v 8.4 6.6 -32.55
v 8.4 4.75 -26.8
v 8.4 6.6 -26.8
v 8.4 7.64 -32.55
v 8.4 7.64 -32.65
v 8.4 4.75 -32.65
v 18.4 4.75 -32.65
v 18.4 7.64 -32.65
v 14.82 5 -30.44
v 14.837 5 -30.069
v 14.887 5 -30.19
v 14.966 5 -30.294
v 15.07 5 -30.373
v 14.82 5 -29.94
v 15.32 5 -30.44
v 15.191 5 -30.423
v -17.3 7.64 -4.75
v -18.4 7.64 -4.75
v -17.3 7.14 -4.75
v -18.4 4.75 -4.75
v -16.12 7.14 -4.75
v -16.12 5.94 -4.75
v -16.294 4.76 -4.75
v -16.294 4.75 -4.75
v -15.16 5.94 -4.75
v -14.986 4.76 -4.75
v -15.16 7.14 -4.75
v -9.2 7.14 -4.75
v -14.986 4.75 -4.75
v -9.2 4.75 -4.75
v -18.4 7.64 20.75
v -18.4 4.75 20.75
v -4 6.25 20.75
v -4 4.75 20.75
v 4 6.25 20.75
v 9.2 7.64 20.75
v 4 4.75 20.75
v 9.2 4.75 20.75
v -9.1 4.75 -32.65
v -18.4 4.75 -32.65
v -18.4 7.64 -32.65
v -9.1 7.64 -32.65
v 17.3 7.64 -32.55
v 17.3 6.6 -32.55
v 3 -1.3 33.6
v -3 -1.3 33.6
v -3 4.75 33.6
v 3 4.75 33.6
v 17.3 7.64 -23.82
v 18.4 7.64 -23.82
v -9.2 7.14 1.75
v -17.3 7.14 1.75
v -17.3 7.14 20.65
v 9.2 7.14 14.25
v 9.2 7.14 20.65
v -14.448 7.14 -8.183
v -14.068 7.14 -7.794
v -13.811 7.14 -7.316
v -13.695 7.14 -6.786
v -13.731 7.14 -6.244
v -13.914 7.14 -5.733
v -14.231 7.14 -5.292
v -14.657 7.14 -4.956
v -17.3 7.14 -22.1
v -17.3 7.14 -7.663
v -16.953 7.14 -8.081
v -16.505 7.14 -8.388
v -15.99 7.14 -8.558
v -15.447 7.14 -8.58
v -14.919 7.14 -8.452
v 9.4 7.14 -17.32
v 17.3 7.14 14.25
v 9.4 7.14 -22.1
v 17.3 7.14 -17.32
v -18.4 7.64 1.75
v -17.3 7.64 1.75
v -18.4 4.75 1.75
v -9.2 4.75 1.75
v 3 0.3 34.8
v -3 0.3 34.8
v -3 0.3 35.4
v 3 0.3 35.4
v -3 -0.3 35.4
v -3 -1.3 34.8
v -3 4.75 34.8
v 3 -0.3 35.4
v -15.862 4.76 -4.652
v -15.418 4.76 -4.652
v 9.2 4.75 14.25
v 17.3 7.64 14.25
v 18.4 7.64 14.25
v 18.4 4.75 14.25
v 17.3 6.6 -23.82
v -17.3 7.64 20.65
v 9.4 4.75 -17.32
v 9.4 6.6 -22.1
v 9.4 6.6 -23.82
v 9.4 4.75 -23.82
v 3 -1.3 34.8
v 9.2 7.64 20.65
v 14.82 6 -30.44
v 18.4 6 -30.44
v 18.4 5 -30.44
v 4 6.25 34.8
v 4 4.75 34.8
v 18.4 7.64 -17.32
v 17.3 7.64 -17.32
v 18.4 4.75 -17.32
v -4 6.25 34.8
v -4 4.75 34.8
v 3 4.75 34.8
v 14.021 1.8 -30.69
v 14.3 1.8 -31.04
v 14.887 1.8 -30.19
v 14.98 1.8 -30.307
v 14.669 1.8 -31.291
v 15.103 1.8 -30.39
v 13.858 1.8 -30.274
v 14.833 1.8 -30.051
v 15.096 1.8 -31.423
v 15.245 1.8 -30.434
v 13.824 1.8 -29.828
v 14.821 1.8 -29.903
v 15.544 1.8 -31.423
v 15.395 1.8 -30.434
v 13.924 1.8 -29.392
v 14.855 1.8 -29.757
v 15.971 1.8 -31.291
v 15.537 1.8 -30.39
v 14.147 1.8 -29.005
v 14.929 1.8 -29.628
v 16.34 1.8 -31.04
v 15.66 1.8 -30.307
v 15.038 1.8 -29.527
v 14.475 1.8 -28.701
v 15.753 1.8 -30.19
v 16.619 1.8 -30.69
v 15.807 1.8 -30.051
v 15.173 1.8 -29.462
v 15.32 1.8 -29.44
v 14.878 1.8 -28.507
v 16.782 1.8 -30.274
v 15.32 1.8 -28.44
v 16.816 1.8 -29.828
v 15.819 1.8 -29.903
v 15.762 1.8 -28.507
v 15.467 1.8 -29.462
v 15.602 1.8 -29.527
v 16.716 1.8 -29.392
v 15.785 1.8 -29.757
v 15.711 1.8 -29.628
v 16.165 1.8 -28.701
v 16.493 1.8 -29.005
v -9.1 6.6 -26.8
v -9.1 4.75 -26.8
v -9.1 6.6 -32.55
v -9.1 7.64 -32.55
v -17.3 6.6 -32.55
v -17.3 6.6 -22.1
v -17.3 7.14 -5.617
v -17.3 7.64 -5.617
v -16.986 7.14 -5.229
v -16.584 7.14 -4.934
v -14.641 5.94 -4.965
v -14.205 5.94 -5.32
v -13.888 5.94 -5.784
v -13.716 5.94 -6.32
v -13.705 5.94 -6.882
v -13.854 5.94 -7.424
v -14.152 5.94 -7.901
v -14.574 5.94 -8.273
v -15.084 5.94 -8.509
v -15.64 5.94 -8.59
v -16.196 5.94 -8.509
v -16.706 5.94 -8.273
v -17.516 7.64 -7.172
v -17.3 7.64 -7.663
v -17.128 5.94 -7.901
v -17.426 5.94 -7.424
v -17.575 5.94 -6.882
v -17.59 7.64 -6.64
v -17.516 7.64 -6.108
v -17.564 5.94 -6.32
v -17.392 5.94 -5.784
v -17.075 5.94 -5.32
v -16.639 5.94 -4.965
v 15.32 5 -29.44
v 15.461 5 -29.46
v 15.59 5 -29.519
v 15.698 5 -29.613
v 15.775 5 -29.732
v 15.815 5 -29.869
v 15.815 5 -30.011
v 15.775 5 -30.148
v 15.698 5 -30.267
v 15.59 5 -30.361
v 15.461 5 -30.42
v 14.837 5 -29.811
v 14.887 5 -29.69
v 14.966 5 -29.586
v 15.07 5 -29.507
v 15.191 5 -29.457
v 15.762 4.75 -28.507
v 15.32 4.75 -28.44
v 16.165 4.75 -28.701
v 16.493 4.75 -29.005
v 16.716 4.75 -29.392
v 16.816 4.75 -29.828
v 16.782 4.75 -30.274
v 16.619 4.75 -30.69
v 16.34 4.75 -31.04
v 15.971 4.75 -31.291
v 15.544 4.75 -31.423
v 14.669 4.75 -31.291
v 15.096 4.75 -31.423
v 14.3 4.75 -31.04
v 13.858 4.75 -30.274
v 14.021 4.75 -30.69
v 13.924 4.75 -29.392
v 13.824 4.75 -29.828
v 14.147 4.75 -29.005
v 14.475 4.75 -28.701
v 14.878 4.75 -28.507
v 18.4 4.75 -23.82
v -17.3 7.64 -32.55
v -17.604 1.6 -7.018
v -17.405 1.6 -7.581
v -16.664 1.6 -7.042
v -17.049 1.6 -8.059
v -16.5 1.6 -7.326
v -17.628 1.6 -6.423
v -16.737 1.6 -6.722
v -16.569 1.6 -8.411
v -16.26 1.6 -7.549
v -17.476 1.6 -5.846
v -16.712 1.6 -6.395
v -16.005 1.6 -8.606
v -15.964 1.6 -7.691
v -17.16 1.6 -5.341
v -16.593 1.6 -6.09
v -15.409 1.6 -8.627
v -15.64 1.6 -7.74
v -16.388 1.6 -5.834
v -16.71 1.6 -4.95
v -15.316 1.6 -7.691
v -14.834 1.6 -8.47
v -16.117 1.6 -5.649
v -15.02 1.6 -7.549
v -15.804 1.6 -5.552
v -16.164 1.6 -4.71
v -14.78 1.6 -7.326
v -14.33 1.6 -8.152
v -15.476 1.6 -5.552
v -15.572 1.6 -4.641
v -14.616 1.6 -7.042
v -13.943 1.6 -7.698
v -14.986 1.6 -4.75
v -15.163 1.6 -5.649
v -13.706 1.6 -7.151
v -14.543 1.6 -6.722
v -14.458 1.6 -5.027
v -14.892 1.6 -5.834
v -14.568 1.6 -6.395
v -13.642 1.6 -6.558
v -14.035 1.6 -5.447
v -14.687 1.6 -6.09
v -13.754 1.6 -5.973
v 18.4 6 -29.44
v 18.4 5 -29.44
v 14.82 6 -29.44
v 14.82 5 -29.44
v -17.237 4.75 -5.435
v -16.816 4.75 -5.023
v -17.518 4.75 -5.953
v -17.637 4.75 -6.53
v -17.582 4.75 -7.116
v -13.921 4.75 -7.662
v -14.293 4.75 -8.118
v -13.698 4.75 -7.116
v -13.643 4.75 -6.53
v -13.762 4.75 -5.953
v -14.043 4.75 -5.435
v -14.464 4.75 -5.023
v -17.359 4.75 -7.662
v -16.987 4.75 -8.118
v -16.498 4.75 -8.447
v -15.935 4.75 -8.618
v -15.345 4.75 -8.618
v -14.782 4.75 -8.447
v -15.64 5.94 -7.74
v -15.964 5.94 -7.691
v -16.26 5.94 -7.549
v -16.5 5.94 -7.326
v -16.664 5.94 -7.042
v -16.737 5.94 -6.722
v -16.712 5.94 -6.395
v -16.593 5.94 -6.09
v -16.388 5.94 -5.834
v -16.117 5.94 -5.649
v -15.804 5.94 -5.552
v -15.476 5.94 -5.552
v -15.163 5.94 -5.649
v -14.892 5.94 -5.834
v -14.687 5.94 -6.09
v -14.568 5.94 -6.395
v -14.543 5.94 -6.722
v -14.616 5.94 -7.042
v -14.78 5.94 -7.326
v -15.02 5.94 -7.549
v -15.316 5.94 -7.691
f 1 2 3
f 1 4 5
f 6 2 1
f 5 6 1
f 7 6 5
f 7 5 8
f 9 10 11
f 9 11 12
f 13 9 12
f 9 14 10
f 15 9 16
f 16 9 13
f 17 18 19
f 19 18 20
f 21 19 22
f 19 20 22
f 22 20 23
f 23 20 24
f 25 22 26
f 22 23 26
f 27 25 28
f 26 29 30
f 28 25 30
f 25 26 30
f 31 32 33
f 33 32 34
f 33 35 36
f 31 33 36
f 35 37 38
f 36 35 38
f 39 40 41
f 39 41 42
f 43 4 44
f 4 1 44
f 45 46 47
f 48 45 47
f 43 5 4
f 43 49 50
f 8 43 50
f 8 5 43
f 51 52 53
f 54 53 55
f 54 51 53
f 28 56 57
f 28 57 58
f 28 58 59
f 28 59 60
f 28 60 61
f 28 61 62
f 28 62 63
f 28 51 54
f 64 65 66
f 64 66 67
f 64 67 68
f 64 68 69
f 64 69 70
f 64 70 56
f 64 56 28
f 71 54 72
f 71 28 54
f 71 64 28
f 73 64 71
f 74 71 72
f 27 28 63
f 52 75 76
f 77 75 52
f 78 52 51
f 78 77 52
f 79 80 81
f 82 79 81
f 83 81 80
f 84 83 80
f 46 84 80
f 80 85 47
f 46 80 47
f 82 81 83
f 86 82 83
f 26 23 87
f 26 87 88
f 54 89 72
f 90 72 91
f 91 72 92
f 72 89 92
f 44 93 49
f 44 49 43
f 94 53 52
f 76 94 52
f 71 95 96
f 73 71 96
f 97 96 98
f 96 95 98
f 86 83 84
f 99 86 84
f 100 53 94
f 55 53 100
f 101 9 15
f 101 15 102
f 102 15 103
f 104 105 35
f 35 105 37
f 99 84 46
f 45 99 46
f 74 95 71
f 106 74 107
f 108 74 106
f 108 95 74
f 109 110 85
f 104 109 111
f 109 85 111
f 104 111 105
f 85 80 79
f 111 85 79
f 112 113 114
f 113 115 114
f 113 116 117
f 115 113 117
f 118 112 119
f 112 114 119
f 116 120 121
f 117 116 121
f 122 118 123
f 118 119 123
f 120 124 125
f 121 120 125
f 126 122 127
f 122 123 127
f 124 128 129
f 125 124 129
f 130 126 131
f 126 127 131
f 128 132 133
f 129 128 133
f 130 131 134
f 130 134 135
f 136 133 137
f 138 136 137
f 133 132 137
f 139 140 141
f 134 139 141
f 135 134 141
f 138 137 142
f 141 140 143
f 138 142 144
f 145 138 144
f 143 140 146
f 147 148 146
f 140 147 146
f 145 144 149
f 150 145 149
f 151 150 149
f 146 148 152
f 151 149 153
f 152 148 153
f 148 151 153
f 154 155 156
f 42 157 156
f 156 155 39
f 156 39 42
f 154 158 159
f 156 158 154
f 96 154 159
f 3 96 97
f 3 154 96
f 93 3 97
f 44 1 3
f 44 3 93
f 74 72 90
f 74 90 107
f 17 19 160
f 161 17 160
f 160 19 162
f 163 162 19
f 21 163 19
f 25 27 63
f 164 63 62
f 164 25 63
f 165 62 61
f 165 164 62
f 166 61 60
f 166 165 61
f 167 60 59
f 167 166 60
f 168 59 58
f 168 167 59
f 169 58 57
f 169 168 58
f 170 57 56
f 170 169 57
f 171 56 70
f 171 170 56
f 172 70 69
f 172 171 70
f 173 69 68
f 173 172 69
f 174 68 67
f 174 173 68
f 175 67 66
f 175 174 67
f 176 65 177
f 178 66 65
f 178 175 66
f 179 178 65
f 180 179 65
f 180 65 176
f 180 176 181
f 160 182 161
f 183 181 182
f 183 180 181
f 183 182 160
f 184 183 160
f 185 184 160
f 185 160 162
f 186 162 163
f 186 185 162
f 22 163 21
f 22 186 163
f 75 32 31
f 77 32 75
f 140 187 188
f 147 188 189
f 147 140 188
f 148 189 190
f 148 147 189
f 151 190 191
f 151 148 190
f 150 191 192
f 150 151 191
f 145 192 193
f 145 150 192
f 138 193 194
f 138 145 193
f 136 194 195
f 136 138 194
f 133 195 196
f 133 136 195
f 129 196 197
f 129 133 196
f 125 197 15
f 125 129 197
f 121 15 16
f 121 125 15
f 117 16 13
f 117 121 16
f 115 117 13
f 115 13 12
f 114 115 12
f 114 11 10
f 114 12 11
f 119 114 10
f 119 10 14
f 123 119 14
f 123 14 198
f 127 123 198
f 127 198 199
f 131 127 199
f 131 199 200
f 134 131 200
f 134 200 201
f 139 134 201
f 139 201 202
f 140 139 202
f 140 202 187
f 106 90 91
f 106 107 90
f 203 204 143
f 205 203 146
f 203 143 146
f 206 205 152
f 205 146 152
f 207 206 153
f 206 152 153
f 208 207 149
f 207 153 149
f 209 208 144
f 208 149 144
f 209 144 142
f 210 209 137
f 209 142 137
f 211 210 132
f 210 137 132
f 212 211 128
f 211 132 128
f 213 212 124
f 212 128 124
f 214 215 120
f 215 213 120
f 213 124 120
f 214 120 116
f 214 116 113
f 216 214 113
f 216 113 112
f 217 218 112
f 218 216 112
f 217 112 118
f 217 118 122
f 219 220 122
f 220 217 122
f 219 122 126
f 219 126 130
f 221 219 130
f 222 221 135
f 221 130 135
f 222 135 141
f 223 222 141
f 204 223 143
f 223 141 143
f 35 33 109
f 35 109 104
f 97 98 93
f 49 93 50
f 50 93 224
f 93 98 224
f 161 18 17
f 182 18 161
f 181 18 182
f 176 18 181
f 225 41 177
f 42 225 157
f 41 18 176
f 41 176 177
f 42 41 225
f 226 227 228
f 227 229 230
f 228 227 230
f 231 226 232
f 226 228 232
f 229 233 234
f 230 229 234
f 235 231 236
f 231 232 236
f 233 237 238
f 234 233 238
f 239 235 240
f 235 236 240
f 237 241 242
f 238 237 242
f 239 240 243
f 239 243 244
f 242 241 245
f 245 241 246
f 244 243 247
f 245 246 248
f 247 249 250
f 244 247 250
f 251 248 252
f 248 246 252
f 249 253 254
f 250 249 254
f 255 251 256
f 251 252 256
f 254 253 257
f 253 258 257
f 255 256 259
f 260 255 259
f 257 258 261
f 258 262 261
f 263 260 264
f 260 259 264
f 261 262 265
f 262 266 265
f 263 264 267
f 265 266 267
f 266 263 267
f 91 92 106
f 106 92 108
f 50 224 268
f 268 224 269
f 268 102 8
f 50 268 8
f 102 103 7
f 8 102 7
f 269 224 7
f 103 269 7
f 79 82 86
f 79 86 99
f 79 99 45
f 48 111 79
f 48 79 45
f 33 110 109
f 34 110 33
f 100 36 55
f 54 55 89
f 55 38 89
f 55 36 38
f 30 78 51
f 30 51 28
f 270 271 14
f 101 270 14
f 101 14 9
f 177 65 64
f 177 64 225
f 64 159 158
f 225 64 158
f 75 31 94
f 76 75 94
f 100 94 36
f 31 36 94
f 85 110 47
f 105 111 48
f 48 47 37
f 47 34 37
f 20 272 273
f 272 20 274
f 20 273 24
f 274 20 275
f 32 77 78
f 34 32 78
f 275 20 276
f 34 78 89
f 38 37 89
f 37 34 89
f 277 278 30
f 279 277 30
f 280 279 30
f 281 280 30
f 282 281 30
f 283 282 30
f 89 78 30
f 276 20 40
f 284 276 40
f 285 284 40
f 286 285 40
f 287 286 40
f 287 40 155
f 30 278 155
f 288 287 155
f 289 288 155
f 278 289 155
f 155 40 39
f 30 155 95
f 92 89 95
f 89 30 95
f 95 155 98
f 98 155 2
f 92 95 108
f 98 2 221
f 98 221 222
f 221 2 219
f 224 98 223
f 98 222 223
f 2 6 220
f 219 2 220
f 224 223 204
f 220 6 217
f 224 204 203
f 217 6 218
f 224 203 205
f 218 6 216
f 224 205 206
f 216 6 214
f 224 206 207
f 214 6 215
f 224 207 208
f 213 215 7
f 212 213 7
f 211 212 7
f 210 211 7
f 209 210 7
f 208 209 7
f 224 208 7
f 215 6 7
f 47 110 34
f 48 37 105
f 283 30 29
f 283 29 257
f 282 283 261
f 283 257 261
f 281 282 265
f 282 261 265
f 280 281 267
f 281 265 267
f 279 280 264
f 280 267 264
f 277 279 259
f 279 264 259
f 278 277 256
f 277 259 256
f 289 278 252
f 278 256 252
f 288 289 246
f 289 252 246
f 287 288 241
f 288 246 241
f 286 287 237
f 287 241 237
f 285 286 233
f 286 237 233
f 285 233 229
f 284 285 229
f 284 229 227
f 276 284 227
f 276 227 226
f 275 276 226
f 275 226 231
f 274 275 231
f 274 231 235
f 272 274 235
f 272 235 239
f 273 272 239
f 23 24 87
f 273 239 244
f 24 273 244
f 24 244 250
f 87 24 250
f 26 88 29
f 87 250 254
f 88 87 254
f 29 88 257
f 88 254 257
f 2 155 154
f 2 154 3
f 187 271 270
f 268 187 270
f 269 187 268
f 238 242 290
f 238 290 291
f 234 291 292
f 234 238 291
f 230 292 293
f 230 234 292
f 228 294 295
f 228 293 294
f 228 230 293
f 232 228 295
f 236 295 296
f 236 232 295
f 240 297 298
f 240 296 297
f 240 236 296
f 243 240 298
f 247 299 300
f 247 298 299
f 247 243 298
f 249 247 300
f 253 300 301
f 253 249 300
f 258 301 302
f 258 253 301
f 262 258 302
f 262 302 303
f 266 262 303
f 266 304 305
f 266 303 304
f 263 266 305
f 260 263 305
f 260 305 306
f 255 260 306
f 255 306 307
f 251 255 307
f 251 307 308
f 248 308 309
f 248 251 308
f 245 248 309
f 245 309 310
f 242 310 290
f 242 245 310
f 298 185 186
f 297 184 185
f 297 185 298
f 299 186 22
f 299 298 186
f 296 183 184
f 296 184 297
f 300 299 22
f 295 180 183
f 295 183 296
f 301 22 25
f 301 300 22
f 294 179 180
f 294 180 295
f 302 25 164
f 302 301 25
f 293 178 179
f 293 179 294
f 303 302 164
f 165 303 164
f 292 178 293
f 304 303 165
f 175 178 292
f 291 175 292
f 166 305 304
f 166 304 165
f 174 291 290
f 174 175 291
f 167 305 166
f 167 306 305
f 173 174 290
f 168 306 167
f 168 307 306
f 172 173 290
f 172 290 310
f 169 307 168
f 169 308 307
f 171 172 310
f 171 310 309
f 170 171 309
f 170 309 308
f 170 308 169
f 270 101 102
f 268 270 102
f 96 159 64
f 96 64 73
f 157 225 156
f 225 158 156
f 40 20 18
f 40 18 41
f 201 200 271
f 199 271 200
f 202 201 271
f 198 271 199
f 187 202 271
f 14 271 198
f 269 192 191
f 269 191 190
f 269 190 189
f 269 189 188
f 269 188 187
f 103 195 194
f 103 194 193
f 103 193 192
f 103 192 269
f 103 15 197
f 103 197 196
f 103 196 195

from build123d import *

# Parameters (mm, degrees)
TRAY_START                        = 4.75
SKETCH1_W                         = 36.8
SKETCH1_H                         = 53.4
TRAY_DEPTH                        = 2.89
GROOVE_START                      = 7.14
SKETCH2_W                         = 34.6
SKETCH2_H                         = 53.2
GROOVE_DEPTH                      = 0.6
GROOVE_START_2                    = 6.6
SKETCH3_W                         = 34.6
SKETCH3_H                         = 10.45
GROOVE_PROTECTION_BOARD_END_DEPTH = 0.55
S1_S3_START                       = 4.65
SKETCH4_W                         = 9.25
SKETCH4_H                         = 6.5
SKETCH4_W_2                       = 9.05
S1_S3_AND_PLUGS_DEPTH             = 3.09
J4_START                          = 4.65
SKETCH5_W                         = 17.5
SKETCH5_H                         = 6
J4_AND_ITS_FLEX_DEPTH             = 3.09
ARM_START                         = 4.75
SKETCH6_W                         = 8
SKETCH6_H                         = 14.2
ARM_DEPTH                         = 1.5
BOARD_START                       = 1.6
SKETCH7_R                         = 2
BOARD_SCREW_FOOT_DEPTH            = 3.16
BOARD_START_2                     = 1.5
SKETCH8_R                         = 1.1
BOARD_SCREW_HOLE_DEPTH            = 6.24
BOARD_START_3                     = 5.94
SKETCH9_R                         = 1.95
BOARD_SCREW_COUNTERBORE_DEPTH     = 1.8
MIC_START                         = 1.8
SKETCH10_R                        = 1.5
MIC_TUBE_DEPTH                    = 2.96
MIC_START_2                       = 1.7
SKETCH11_R                        = 0.5
MIC_BORE_DEPTH                    = 4.3
MIC_START_3                       = 5
SKETCH12_W                        = 3.68
SKETCH12_H                        = 1
MIC_DUCT_DEPTH                    = 1
SNAP_START                        = -3
SNAP_DEPTH                        = 6


with BuildPart() as part:
    # Sketch1 → Tray (new body)
    with BuildSketch(Plane(origin=(0, 0, 0), x_dir=(1, 0, 0), z_dir=(0, 1, 0)).offset(TRAY_START)):
        with Locations((0, 5.95)):
            Rectangle(SKETCH1_W, SKETCH1_H)
    extrude(amount=TRAY_DEPTH)

    # Sketch2 → Groove (cut)
    with BuildSketch(Plane(origin=(0, 0, 0), x_dir=(1, 0, 0), z_dir=(0, 1, 0)).offset(GROOVE_START)):
        with Locations((0, 5.95)):
            Rectangle(SKETCH2_W, SKETCH2_H)
    extrude(amount=GROOVE_DEPTH, mode=Mode.SUBTRACT)

    # Sketch3 → Groove, protection-board end (cut)
    with BuildSketch(Plane(origin=(0, 0, 0), x_dir=(1, 0, 0), z_dir=(0, 1, 0)).offset(GROOVE_START_2)):
        with Locations((0, 27.325)):
            Rectangle(SKETCH3_W, SKETCH3_H)
    extrude(amount=GROOVE_PROTECTION_BOARD_END_DEPTH, mode=Mode.SUBTRACT)

    # Sketch4 → S1-S3 and plugs (cut)
    with BuildSketch(Plane(origin=(0, 0, 0), x_dir=(1, 0, 0), z_dir=(0, 1, 0)).offset(S1_S3_START)):
        with Locations((-13.825, 1.5)):
            Rectangle(SKETCH4_W, SKETCH4_H)
        with Locations((13.925, 20.57)):
            Rectangle(SKETCH4_W_2, SKETCH4_H)
        with Locations((13.825, -17.5)):
            Rectangle(SKETCH4_W, SKETCH4_H)
    extrude(amount=S1_S3_AND_PLUGS_DEPTH, mode=Mode.SUBTRACT)

    # Sketch5 → J4 and its flex (cut)
    with BuildSketch(Plane(origin=(0, 0, 0), x_dir=(1, 0, 0), z_dir=(0, 1, 0)).offset(J4_START)):
        with Locations((-0.35, 29.8)):
            Rectangle(SKETCH5_W, SKETCH5_H)
    extrude(amount=J4_AND_ITS_FLEX_DEPTH, mode=Mode.SUBTRACT)

    # Sketch6 → Arm (add)
    with BuildSketch(Plane(origin=(0, 0, 0), x_dir=(1, 0, 0), z_dir=(0, 1, 0)).offset(ARM_START)):
        with Locations((0, -27.7)):
            Rectangle(SKETCH6_W, SKETCH6_H)
    extrude(amount=ARM_DEPTH)

    # Sketch7 → Board screw foot (add)
    with BuildSketch(Plane(origin=(0, 0, 0), x_dir=(1, 0, 0), z_dir=(0, 1, 0)).offset(BOARD_START)):
        with Locations(Location((-15.64, 6.64, 0), (0, 0, 289.091052509))):
            Circle(SKETCH7_R)
    extrude(amount=BOARD_SCREW_FOOT_DEPTH)

    # Sketch8 → Board screw hole (cut)
    with BuildSketch(Plane(origin=(0, 0, 0), x_dir=(1, 0, 0), z_dir=(0, 1, 0)).offset(BOARD_START_2)):
        with Locations(Location((-15.64, 6.64, 0), (0, 0, 90))):
            Circle(SKETCH8_R)
    extrude(amount=BOARD_SCREW_HOLE_DEPTH, mode=Mode.SUBTRACT)

    # Sketch9 → Board screw counterbore (cut)
    with BuildSketch(Plane(origin=(0, 0, 0), x_dir=(1, 0, 0), z_dir=(0, 1, 0)).offset(BOARD_START_3)):
        with Locations((-15.64, 6.64)):
            Circle(SKETCH9_R)
    extrude(amount=BOARD_SCREW_COUNTERBORE_DEPTH, mode=Mode.SUBTRACT)

    # Sketch10 → Mic tube (add)
    with BuildSketch(Plane(origin=(0, 0, 0), x_dir=(1, 0, 0), z_dir=(0, 1, 0)).offset(MIC_START)):
        with Locations(Location((15.32, 29.94, 0), (0, 0, 270))):
            Circle(SKETCH10_R)
    extrude(amount=MIC_TUBE_DEPTH)

    # Sketch11 → Mic bore (cut)
    with BuildSketch(Plane(origin=(0, 0, 0), x_dir=(1, 0, 0), z_dir=(0, 1, 0)).offset(MIC_START_2)):
        with Locations(Location((15.32, 29.94, 0), (0, 0, 270))):
            Circle(SKETCH11_R)
    extrude(amount=MIC_BORE_DEPTH, mode=Mode.SUBTRACT)

    # Sketch12 → Mic duct (cut)
    with BuildSketch(Plane(origin=(0, 0, 0), x_dir=(1, 0, 0), z_dir=(0, 1, 0)).offset(MIC_START_3)):
        with Locations((16.66, 29.94)):
            Rectangle(SKETCH12_W, SKETCH12_H)
    extrude(amount=MIC_DUCT_DEPTH, mode=Mode.SUBTRACT)

    # Sketch13 → Snap (add)
    with BuildSketch(Plane(origin=(0, 0, 0), x_dir=(0, 0, -1), z_dir=(1, 0, 0)).offset(SNAP_START)):
        Polygon((-33.6, 5.25), (-34.8, 5.25), (-34.8, 0.3), (-35.4, 0.3), (-35.4, -0.3), (-34.8, -1.3), (-33.6, -1.3), align=None)
    extrude(amount=SNAP_DEPTH)


solid = part.part
